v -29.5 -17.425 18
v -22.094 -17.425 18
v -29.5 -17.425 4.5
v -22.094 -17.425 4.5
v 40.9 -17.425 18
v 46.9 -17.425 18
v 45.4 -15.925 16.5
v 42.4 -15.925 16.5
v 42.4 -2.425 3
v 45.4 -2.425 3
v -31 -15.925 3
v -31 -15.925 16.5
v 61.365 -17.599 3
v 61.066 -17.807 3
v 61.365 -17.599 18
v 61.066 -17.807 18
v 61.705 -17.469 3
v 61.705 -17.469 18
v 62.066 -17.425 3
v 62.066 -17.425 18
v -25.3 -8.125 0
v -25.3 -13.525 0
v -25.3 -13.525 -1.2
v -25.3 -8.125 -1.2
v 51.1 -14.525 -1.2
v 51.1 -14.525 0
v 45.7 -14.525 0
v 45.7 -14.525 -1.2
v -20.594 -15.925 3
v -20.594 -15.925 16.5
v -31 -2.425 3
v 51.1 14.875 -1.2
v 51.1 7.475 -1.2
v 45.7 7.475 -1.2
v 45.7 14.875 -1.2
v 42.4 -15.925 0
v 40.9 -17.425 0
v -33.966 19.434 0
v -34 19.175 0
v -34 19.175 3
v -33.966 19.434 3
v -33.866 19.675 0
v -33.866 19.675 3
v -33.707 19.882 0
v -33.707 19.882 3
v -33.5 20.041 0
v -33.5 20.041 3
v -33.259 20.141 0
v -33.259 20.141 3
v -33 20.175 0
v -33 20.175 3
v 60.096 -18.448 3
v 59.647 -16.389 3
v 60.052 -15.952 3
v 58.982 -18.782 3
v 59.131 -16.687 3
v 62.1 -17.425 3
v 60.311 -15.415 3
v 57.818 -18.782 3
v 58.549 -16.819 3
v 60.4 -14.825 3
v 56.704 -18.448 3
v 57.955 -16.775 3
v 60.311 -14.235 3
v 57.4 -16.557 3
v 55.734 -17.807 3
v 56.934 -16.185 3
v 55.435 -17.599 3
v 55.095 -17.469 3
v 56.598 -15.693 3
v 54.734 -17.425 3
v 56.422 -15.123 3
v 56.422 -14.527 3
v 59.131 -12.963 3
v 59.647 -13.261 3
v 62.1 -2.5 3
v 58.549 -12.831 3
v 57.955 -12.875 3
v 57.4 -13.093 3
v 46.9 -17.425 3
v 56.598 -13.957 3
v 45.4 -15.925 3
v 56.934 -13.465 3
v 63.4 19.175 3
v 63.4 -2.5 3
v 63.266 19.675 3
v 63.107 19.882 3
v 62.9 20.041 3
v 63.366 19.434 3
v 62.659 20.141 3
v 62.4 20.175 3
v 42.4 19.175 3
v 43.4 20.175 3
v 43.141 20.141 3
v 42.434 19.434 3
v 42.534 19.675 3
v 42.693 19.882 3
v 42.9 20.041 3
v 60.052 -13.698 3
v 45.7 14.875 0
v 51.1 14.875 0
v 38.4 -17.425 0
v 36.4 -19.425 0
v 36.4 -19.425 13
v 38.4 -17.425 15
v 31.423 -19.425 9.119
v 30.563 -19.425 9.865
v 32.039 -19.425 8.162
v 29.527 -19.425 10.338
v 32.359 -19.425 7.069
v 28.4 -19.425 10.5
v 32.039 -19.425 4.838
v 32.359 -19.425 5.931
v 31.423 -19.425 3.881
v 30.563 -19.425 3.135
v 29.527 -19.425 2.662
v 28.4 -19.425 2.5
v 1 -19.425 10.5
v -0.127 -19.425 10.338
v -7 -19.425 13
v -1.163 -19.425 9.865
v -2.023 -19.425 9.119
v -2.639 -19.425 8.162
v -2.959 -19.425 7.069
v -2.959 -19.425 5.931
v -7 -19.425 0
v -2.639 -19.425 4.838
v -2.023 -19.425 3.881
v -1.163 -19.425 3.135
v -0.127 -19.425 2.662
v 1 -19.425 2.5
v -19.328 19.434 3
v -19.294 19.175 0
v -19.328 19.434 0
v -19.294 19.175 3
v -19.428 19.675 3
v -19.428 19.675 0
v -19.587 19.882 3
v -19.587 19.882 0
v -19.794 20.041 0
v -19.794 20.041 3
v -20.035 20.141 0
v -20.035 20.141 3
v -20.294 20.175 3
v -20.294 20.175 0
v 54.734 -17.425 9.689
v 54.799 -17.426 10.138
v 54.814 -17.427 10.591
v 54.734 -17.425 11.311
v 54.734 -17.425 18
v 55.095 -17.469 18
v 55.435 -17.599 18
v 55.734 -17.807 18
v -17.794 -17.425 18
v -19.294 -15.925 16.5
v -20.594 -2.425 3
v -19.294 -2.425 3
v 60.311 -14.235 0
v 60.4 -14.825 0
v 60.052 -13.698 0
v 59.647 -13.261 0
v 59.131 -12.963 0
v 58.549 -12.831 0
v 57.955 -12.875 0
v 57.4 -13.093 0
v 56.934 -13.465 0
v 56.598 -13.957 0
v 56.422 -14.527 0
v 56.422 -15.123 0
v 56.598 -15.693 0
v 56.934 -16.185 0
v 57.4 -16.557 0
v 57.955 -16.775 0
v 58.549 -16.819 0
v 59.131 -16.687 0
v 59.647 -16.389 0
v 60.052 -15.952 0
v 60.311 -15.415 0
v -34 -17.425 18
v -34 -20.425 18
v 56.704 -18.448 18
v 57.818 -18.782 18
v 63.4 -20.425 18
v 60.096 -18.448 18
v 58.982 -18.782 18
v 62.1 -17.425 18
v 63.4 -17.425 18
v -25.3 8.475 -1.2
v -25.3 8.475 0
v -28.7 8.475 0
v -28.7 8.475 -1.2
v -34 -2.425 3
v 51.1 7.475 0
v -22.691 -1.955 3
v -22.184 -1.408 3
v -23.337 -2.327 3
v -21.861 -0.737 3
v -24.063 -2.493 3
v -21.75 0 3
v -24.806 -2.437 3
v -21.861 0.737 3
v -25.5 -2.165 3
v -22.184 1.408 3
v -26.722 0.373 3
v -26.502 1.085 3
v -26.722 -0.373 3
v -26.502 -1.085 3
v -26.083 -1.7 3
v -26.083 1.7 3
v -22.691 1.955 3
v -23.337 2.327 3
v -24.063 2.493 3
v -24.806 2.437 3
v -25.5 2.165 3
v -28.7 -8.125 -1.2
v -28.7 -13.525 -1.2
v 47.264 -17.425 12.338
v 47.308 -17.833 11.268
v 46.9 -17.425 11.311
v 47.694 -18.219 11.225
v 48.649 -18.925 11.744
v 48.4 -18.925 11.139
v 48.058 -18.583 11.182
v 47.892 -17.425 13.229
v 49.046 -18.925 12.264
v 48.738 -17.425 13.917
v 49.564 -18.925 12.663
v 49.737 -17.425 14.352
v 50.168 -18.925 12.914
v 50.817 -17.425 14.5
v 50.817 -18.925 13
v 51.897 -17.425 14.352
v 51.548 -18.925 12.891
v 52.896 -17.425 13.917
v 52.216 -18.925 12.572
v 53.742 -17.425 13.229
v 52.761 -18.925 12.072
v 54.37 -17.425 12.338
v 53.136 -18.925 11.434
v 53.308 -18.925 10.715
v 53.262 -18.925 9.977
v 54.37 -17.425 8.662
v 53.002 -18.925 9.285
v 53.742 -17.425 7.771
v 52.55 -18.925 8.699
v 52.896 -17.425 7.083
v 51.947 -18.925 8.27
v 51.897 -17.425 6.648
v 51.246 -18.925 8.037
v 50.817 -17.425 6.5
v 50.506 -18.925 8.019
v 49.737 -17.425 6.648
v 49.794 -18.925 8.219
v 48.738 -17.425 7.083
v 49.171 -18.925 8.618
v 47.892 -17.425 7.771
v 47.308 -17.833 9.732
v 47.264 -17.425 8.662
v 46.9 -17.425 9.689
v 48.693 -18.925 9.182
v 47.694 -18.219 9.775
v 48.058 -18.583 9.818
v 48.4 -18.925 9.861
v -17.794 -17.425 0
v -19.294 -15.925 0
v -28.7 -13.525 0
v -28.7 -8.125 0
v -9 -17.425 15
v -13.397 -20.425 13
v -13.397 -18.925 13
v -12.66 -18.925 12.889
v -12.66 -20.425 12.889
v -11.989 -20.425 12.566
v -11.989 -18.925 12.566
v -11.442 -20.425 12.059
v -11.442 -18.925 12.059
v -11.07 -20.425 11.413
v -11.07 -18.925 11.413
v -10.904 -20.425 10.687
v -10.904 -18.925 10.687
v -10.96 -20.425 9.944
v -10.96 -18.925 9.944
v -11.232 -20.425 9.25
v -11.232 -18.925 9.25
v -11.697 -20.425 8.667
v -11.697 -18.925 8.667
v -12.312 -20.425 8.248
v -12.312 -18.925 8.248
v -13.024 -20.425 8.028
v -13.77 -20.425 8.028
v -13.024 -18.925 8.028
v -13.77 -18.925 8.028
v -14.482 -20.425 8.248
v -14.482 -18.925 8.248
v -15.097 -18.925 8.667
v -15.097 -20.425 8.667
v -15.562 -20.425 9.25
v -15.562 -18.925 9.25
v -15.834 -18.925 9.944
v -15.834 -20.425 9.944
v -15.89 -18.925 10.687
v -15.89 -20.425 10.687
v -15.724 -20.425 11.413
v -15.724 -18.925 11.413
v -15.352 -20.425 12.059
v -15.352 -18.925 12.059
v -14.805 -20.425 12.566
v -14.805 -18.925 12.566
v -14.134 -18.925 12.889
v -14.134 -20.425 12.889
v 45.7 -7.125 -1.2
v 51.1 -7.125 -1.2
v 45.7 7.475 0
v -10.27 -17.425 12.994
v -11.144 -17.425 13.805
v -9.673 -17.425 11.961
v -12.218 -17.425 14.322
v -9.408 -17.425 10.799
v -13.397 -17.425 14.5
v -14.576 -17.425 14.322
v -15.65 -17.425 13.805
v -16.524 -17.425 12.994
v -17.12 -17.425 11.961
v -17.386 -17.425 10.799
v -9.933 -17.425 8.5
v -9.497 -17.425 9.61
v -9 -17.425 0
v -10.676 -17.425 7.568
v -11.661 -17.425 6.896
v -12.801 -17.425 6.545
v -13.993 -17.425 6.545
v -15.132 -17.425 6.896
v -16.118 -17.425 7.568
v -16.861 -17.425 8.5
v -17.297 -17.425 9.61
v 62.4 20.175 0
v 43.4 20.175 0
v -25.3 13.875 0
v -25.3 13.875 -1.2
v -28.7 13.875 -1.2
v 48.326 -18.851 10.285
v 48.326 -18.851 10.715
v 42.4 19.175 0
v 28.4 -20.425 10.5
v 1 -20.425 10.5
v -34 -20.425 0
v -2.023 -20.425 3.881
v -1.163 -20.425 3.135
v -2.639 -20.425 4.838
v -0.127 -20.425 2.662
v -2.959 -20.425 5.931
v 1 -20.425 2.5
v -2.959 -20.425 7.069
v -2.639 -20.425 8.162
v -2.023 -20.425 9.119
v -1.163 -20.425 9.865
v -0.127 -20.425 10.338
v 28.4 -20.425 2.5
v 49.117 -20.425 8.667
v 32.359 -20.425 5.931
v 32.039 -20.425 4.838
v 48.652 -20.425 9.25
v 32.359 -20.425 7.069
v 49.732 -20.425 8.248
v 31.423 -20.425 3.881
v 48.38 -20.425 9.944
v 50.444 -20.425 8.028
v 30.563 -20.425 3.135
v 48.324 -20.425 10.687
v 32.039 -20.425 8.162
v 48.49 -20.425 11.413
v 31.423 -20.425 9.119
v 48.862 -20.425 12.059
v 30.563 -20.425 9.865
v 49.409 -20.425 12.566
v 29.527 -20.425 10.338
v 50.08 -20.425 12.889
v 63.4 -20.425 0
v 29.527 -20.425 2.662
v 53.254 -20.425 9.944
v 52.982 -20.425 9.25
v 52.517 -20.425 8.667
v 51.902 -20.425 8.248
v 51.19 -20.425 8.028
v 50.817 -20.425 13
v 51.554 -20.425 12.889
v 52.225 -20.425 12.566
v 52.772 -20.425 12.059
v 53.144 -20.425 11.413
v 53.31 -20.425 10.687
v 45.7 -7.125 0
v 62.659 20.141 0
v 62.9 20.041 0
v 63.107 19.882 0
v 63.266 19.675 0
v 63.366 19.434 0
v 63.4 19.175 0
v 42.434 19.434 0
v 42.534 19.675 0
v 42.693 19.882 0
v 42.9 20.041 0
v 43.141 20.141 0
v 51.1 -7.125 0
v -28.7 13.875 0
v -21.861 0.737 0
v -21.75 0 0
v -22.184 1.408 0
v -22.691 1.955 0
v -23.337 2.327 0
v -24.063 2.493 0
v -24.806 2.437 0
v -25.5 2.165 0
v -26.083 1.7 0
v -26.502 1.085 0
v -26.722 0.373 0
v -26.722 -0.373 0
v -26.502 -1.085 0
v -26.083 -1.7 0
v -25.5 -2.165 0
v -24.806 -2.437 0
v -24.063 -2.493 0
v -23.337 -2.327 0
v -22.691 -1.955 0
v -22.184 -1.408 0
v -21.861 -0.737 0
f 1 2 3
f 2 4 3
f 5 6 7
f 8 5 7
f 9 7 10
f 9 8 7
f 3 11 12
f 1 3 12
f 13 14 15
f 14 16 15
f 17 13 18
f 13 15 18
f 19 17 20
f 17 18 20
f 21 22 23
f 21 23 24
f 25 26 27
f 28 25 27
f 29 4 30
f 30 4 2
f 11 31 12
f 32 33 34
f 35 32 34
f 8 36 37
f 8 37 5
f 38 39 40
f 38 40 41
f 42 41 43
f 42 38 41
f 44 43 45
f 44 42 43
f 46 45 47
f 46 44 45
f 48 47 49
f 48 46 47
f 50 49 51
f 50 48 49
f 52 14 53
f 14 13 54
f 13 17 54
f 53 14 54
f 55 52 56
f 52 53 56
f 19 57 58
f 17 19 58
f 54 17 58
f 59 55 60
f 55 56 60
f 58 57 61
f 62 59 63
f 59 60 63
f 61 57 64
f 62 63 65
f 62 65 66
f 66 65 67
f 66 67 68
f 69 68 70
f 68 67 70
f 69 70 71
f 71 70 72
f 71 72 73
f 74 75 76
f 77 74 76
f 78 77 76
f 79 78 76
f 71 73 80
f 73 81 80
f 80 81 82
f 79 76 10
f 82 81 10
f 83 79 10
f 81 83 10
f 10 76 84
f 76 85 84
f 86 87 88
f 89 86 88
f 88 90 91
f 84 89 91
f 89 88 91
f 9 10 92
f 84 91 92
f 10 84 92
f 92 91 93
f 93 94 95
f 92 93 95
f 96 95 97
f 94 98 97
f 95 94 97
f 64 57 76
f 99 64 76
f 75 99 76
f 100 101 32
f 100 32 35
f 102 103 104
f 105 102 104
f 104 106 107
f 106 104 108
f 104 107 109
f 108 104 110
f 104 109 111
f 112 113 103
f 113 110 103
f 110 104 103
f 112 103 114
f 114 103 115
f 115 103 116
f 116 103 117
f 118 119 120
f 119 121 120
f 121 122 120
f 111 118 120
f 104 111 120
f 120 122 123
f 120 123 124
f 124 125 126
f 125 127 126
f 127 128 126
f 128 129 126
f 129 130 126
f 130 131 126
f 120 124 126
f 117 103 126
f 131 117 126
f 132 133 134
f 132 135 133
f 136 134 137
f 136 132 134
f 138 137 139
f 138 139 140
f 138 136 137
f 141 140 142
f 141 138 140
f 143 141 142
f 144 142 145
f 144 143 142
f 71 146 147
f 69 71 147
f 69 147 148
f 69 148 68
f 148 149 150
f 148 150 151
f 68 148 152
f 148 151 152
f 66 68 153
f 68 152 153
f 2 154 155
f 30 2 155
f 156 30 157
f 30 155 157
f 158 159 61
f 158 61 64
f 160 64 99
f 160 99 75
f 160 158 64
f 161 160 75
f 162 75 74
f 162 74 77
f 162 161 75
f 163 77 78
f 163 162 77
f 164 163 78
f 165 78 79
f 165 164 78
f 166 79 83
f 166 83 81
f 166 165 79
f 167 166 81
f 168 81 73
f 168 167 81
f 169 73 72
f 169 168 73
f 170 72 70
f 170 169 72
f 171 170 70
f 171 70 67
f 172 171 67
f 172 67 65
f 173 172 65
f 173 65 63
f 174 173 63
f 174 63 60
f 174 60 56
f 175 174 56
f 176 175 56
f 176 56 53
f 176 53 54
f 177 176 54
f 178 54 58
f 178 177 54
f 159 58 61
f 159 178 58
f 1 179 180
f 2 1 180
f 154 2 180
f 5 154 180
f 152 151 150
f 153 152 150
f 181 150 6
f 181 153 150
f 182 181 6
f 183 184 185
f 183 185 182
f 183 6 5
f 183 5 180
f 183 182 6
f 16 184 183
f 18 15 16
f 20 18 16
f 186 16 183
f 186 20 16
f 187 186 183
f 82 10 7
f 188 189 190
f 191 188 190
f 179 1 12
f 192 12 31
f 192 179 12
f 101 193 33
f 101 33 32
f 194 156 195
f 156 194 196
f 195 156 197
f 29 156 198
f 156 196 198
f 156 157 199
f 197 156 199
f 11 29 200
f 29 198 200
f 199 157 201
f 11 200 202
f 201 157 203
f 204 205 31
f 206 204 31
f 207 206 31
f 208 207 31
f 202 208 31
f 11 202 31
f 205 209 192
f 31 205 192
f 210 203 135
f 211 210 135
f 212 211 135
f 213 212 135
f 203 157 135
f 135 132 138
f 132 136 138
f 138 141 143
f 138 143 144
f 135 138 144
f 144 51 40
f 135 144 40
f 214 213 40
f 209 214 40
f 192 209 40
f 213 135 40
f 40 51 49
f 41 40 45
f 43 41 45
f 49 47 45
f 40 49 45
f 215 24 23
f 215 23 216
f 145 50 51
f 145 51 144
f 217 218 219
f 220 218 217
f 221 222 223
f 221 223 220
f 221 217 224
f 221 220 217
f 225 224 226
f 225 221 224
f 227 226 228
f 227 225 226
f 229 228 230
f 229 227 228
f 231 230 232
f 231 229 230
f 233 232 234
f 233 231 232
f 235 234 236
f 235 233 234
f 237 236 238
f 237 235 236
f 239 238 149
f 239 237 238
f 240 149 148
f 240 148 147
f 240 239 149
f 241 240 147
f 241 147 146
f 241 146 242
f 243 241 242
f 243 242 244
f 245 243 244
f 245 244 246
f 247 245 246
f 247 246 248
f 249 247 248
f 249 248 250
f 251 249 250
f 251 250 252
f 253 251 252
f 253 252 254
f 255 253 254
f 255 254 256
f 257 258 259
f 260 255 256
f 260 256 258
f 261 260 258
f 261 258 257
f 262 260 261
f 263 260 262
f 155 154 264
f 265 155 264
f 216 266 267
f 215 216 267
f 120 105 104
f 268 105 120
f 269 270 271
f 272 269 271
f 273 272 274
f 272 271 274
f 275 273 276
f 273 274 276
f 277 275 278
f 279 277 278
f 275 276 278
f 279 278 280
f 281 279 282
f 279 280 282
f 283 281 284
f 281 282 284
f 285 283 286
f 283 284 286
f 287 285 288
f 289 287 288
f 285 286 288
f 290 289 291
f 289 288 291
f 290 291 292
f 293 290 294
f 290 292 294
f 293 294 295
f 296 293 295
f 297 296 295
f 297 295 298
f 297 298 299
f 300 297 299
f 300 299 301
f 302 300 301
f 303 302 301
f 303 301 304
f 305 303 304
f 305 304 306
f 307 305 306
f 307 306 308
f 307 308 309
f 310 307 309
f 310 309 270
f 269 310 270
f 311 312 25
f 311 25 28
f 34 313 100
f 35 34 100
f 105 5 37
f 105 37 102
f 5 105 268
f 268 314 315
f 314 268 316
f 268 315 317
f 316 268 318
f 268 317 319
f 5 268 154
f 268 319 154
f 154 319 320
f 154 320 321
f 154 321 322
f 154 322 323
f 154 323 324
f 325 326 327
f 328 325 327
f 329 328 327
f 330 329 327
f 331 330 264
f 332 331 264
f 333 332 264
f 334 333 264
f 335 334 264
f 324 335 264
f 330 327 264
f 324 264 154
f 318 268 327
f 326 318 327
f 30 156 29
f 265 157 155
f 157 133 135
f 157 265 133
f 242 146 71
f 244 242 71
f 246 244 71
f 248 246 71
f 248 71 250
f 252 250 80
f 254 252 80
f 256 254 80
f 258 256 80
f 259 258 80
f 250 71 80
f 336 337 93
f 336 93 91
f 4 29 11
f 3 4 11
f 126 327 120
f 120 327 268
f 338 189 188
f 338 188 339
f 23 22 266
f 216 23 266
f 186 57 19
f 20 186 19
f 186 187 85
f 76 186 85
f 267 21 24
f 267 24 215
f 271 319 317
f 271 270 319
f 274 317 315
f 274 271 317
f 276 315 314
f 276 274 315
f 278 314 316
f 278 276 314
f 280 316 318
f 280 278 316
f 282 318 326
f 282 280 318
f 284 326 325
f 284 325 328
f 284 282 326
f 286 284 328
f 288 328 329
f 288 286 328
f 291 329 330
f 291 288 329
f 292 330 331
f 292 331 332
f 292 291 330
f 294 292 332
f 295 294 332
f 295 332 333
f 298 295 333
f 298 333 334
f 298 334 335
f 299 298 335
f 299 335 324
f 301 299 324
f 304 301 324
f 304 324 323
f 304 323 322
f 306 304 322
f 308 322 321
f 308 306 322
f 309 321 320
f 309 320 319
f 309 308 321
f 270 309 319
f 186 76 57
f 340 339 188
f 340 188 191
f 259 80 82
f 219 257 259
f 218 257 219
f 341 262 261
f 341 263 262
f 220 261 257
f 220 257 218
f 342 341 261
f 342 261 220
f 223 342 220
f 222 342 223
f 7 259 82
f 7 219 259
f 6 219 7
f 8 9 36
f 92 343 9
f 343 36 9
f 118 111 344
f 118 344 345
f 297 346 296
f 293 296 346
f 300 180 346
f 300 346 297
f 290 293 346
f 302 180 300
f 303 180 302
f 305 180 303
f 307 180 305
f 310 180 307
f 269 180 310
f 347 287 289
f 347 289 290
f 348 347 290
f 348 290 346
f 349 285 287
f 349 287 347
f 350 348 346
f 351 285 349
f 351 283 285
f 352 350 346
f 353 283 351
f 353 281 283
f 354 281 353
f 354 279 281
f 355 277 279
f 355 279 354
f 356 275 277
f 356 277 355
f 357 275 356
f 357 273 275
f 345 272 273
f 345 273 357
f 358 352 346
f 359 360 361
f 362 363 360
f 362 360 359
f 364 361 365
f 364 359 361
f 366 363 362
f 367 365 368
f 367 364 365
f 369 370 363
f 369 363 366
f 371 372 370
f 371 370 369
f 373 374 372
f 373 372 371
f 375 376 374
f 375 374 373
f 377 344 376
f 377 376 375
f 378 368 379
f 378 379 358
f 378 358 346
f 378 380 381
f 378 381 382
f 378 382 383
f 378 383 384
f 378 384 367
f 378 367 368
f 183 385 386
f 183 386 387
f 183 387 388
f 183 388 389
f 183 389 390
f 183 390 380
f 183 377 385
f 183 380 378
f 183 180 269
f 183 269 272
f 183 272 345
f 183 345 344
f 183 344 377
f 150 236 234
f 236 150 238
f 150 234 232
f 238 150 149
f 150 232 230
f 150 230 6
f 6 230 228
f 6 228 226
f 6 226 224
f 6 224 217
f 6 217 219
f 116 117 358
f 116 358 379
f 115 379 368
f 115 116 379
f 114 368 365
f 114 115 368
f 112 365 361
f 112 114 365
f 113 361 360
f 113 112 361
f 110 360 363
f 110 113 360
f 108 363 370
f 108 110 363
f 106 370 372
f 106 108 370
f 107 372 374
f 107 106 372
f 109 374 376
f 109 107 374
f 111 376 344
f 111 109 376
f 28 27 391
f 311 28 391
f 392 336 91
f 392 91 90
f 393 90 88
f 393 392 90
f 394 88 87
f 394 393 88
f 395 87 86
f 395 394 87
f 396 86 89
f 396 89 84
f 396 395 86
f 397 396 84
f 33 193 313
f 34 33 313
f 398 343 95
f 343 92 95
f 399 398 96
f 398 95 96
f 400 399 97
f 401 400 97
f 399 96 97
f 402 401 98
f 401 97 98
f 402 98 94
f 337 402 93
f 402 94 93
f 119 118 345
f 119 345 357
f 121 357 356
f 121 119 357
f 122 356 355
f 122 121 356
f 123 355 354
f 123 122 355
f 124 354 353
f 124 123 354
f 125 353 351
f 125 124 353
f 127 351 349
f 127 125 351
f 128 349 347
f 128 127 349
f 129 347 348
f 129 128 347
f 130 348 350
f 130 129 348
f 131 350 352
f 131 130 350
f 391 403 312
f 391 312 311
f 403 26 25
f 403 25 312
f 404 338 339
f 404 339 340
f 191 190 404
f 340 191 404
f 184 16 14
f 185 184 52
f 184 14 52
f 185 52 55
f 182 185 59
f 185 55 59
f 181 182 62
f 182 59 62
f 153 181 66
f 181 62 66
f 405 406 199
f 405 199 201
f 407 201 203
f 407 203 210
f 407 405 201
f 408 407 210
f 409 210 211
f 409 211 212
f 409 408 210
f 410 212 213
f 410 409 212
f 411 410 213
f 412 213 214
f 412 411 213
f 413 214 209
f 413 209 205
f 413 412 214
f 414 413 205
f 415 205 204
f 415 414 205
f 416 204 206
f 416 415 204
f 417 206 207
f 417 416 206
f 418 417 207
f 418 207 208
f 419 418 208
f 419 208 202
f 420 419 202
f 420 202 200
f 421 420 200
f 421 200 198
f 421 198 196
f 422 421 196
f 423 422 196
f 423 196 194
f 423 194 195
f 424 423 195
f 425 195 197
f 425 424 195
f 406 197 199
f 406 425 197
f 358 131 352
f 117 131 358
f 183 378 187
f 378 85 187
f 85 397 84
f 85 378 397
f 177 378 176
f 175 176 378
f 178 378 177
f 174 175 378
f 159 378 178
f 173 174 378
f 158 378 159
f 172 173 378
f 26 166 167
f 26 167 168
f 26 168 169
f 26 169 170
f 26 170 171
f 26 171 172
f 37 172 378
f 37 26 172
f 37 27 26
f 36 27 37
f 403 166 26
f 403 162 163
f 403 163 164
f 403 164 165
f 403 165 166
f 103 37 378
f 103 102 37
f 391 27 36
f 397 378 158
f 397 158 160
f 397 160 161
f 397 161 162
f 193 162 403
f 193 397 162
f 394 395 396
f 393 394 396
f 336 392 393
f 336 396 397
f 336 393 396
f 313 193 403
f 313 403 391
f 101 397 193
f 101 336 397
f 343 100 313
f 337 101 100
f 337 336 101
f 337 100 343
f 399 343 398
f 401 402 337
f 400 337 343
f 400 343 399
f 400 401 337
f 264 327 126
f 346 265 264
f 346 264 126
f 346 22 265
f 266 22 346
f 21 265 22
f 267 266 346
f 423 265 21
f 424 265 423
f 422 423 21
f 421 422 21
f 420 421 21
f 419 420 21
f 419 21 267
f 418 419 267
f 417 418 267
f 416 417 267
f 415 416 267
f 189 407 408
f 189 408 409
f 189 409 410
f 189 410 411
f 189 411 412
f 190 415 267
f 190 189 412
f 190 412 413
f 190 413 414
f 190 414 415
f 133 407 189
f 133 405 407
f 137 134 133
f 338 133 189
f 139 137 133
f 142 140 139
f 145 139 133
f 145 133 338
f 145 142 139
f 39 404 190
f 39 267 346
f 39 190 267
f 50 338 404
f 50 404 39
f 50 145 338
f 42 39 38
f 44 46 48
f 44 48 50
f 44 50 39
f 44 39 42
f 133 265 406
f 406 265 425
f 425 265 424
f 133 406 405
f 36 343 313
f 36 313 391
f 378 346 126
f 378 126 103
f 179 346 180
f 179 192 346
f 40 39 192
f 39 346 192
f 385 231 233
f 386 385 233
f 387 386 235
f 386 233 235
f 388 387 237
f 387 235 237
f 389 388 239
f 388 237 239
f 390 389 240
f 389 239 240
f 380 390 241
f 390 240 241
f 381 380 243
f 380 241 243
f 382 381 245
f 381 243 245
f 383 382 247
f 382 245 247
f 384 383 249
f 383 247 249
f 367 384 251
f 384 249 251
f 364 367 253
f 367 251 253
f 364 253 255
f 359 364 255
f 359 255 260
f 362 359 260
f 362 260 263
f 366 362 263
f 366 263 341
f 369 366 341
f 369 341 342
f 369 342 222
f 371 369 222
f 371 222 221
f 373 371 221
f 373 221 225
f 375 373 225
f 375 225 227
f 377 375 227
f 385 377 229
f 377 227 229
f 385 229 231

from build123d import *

# Parameters (mm, degrees)
ESBO_O2_R                = 2.5
ESBO_O2_R_2              = 2
RESSALTO_EXTRUS_O1_DEPTH = 3
ESBO_O3_W                = 5.4
ESBO_O3_H                = 7.4
ESBO_O3_W_2              = 3.4
ESBO_O3_H_2              = 5.4
RESSALTO_EXTRUS_O2_DEPTH = 1.2
RESSALTO_EXTRUS_O3_DEPTH = 15
CHANFRO1_SIZE            = 2
FILETE1_R                = 1.5
FILETE2_R                = 1
RESSALTO_EXTRUS_O4_DEPTH = 3
RESSALTO_EXTRUS_O5_DEPTH = 1.3
RESSALTO_EXTRUS_O6_DEPTH = 1.3
RESSALTO_EXTRUS_O7_DEPTH = 3
CHANFRO2_SIZE            = 1.5
ESBO_O10_R               = 2.5
CORTE_EXTRUS_O1_DEPTH    = 13
CHANFRO3_SIZE            = 1.5
CORTE_EXTRUS_O2_DEPTH    = 13
ESBO_O12_W               = 47.4
ESBO_O12_H               = 3
RESSALTO_EXTRUS_O8_DEPTH = 3
CHANFRO4_SIZE            = 2


# Some blends are built 0.0001 mm under size
with BuildPart() as part:
    # Esboço2 → Ressalto-extrusão1 (new body)
    with BuildSketch(Plane.XY):
        with BuildLine():
            Line((-19.293876913, 20.175), (-19.293876913, -17.425))
            Line((-19.293876913, -17.425), (-9, -17.425))
            Line((-9, -17.425), (-9, -19.425))
            Line((-9, -19.425), (38.4, -19.425))
            Line((38.4, -19.425), (38.4, -17.425))
            Line((38.4, -17.425), (42.4, -17.425))
            Line((42.4, -17.425), (42.4, 20.175))
            Line((42.4, 20.175), (62.4, 20.175))
            ThreePointArc((62.4, 20.175), (63.107106781, 19.882106781), (63.4, 19.175))
            Line((63.4, 19.175), (63.4, -20.425))
            Line((63.4, -20.425), (42.4, -20.425))
            Line((42.4, -20.425), (-19.293876913, -20.425))
            Line((-19.293876913, -20.425), (-34, -20.425))
            Line((-34, -20.425), (-34, 19.175))
            ThreePointArc((-34, 19.175), (-33.707106781, 19.882106781), (-33, 20.175))
            Line((-33, 20.175), (-19.293876913, 20.175))
        make_face()
        with Locations((-24.25, 0)):
            Circle(ESBO_O2_R, mode=Mode.SUBTRACT)
        with Locations((58.4, -14.825)):
            Circle(ESBO_O2_R_2, mode=Mode.SUBTRACT)
    extrude(amount=RESSALTO_EXTRUS_O1_DEPTH)

    # Esboço3 → Ressalto-extrusão2 (add)
    with BuildSketch(Plane(origin=(0, 0, 0), x_dir=(-1, 0, 0), z_dir=(0, 0, -1))):
        with Locations((-48.4, 11.175)):
            Rectangle(ESBO_O3_W, ESBO_O3_H)
        with Locations((-48.4, -10.825)):
            Rectangle(ESBO_O3_W, ESBO_O3_H)
        with Locations((27, 11.175)):
            Rectangle(ESBO_O3_W_2, ESBO_O3_H_2)
        with Locations((27, -10.825)):
            Rectangle(ESBO_O3_W_2, ESBO_O3_H_2)
    extrude(amount=RESSALTO_EXTRUS_O2_DEPTH)

    # Esboço4 → Ressalto-extrusão3 (add)
    with BuildSketch(Plane.XY.offset(3)):
        with BuildLine():
            Line((-34, -20.425), (63.4, -20.425))
            Line((63.4, -20.425), (63.4, -17.425))
            Line((63.4, -17.425), (61.439736831, -17.425))
            ThreePointArc((61.439736831, -17.425), (58.4, -18.825), (55.360263169, -17.425))
            Line((55.360263169, -17.425), (38.4, -17.425))
            Line((38.4, -17.425), (38.4, -19.425))
            Line((38.4, -19.425), (-9, -19.425))
            Line((-9, -19.425), (-9, -17.425))
            Line((-9, -17.425), (-34, -17.425))
            Line((-34, -17.425), (-34, -20.425))
        make_face()
    extrude(amount=RESSALTO_EXTRUS_O3_DEPTH)

    # Chanfro1
    chanfro1_edges = [part.edges().sort_by_distance(p)[0] for p in [
        (38.4, -19.425, 9),
        (-9, -19.425, 9),
    ]]
    chamfer(chanfro1_edges, length=CHANFRO1_SIZE - 0.0001)  # a hair under: the kernel refuses the full size

    # Filete1
    filete1_edges = [part.edges().sort_by_distance(p)[0] for p in [
        (61.439736831, -17.425, 10.5),
        (55.360263169, -17.425, 10.5),
    ]]
    fillet(filete1_edges, radius=FILETE1_R)

    # Filete2
    filete2_edges = [part.edges().sort_by_distance(p)[0] for p in [
        (-19.293876913, 20.175, 1.5),
        (42.4, 20.175, 1.5),
    ]]
    fillet(filete2_edges, radius=FILETE2_R)

    # Esboço6 → Ressalto-extrusão4 (add)
    with BuildSketch(Plane.ZY.offset(34)):
        Polygon((18, -17.425), (3, -2.425), (3, -17.425), align=None)
    extrude(amount=-RESSALTO_EXTRUS_O4_DEPTH)

    # Esboço7 → Ressalto-extrusão5 (add)
    with BuildSketch(Plane(origin=(63.4, 0, 0), x_dir=(0, 0, -1), z_dir=(1, 0, 0))):
        Polygon((-18, -17.425), (-3, -2.5), (-3, -17.425), align=None)
    extrude(amount=-RESSALTO_EXTRUS_O5_DEPTH)

    # Esboço8 → Ressalto-extrusão6 (add)
    with BuildSketch(Plane(origin=(-19.293876913, 0, 0), x_dir=(0, 0, -1), z_dir=(1, 0, 0))):
        Polygon((-3, -2.425), (-3, -17.425), (-18, -17.425), align=None)
    extrude(amount=-RESSALTO_EXTRUS_O6_DEPTH)

    # Esboço9 → Ressalto-extrusão7 (add)
    with BuildSketch(Plane.ZY.offset(-42.4)):
        Polygon((3, -2.425), (3, -17.425), (18, -17.425), align=None)
    extrude(amount=-RESSALTO_EXTRUS_O7_DEPTH)

    # Chanfro2
    chanfro2_edges = [part.edges().sort_by_distance(p)[0] for p in [
        (-31, -17.425, 10.5),
        (-25.796938457, -17.425, 3),
        (-20.593876913, -17.425, 10.5),
        (45.4, -17.425, 10.5),
        (-19.293876913, -17.425, 9),
        (42.4, -17.425, 9),
    ]]
    chamfer(chanfro2_edges, length=CHANFRO2_SIZE)

    # Esboço10 → Corte-extrusão1 (cut)
    with BuildSketch(Plane(origin=(0, -17.425, 0), x_dir=(1, 0, 0), z_dir=(0, 1, 0))):
        with Locations(Location((-13.396938457, -10.5, 0), (0, 0, 270))):
            Circle(ESBO_O10_R)
        with Locations(Location((50.816969722, -10.5, 0), (0, 0, 270))):
            Circle(ESBO_O10_R)
    extrude(amount=-CORTE_EXTRUS_O1_DEPTH, mode=Mode.SUBTRACT)

    # Chanfro3
    # the kernel refuses this chamfer: 1.5 mm, written as the material it takes off along each edge
    with BuildSketch(Plane(origin=(-13.396938457, -17.425, 10.5), x_dir=(0, 0, 1), z_dir=(-1, 0, 0))) as chanfro3_piece_1:
        Polygon((2.5 + CHANFRO3_SIZE, 0), (2.5, -CHANFRO3_SIZE), (2.5, 0), align=None)
    revolve(axis=Axis((-13.396938457, -17.425, 10.5), (0, 1, 0)), mode=Mode.SUBTRACT)
    with BuildSketch(Plane(origin=(50.816969722, -17.425, 10.5), x_dir=(0, 0, 1), z_dir=(-1, 0, 0))) as chanfro3_piece_2_section:
        Polygon((2.5 + CHANFRO3_SIZE, 0), (2.5, -CHANFRO3_SIZE), (2.5, 0), align=None)
    chanfro3_piece_2 = revolve(axis=Axis((50.816969722, -17.425, 10.5), (0, 1, 0)), mode=Mode.PRIVATE)
    chanfro3_piece_2 = split(chanfro3_piece_2, bisect_by=Plane(origin=(50.475171982, -21.000171982, 8.459359331), z_dir=(0.7071067811865476, 0.7071067811865476, 0)), keep=Keep.TOP, mode=Mode.PRIVATE)
    add(chanfro3_piece_2, mode=Mode.SUBTRACT)

    # Esboço11 → Corte-extrusão2 (cut)
    with BuildSketch(Plane(origin=(0, -19.425, 0), x_dir=(1, 0, 0), z_dir=(0, 1, 0))):
        with BuildLine():
            Line((1, -2.5), (28.4, -2.5))
            ThreePointArc((28.4, -2.5), (32.4, -6.5), (28.4, -10.5))
            Line((28.4, -10.5), (1, -10.5))
            ThreePointArc((1, -10.5), (-3, -6.5), (1, -2.5))
        make_face()
    extrude(amount=-CORTE_EXTRUS_O2_DEPTH, mode=Mode.SUBTRACT)

    # Esboço12 → Ressalto-extrusão8 (add)
    with BuildSketch(Plane.XY.offset(18)):
        with Locations((14.7, -18.925)):
            Rectangle(ESBO_O12_W, ESBO_O12_H)
    extrude(amount=-RESSALTO_EXTRUS_O8_DEPTH)

    # Chanfro4
    chanfro4_edges = [part.edges().sort_by_distance(p)[0] for p in [
        (14.7, -19.425, 15),
    ]]
    chamfer(chanfro4_edges, length=CHANFRO4_SIZE - 0.0001)  # a hair under: the kernel refuses the full size


solid = part.part
